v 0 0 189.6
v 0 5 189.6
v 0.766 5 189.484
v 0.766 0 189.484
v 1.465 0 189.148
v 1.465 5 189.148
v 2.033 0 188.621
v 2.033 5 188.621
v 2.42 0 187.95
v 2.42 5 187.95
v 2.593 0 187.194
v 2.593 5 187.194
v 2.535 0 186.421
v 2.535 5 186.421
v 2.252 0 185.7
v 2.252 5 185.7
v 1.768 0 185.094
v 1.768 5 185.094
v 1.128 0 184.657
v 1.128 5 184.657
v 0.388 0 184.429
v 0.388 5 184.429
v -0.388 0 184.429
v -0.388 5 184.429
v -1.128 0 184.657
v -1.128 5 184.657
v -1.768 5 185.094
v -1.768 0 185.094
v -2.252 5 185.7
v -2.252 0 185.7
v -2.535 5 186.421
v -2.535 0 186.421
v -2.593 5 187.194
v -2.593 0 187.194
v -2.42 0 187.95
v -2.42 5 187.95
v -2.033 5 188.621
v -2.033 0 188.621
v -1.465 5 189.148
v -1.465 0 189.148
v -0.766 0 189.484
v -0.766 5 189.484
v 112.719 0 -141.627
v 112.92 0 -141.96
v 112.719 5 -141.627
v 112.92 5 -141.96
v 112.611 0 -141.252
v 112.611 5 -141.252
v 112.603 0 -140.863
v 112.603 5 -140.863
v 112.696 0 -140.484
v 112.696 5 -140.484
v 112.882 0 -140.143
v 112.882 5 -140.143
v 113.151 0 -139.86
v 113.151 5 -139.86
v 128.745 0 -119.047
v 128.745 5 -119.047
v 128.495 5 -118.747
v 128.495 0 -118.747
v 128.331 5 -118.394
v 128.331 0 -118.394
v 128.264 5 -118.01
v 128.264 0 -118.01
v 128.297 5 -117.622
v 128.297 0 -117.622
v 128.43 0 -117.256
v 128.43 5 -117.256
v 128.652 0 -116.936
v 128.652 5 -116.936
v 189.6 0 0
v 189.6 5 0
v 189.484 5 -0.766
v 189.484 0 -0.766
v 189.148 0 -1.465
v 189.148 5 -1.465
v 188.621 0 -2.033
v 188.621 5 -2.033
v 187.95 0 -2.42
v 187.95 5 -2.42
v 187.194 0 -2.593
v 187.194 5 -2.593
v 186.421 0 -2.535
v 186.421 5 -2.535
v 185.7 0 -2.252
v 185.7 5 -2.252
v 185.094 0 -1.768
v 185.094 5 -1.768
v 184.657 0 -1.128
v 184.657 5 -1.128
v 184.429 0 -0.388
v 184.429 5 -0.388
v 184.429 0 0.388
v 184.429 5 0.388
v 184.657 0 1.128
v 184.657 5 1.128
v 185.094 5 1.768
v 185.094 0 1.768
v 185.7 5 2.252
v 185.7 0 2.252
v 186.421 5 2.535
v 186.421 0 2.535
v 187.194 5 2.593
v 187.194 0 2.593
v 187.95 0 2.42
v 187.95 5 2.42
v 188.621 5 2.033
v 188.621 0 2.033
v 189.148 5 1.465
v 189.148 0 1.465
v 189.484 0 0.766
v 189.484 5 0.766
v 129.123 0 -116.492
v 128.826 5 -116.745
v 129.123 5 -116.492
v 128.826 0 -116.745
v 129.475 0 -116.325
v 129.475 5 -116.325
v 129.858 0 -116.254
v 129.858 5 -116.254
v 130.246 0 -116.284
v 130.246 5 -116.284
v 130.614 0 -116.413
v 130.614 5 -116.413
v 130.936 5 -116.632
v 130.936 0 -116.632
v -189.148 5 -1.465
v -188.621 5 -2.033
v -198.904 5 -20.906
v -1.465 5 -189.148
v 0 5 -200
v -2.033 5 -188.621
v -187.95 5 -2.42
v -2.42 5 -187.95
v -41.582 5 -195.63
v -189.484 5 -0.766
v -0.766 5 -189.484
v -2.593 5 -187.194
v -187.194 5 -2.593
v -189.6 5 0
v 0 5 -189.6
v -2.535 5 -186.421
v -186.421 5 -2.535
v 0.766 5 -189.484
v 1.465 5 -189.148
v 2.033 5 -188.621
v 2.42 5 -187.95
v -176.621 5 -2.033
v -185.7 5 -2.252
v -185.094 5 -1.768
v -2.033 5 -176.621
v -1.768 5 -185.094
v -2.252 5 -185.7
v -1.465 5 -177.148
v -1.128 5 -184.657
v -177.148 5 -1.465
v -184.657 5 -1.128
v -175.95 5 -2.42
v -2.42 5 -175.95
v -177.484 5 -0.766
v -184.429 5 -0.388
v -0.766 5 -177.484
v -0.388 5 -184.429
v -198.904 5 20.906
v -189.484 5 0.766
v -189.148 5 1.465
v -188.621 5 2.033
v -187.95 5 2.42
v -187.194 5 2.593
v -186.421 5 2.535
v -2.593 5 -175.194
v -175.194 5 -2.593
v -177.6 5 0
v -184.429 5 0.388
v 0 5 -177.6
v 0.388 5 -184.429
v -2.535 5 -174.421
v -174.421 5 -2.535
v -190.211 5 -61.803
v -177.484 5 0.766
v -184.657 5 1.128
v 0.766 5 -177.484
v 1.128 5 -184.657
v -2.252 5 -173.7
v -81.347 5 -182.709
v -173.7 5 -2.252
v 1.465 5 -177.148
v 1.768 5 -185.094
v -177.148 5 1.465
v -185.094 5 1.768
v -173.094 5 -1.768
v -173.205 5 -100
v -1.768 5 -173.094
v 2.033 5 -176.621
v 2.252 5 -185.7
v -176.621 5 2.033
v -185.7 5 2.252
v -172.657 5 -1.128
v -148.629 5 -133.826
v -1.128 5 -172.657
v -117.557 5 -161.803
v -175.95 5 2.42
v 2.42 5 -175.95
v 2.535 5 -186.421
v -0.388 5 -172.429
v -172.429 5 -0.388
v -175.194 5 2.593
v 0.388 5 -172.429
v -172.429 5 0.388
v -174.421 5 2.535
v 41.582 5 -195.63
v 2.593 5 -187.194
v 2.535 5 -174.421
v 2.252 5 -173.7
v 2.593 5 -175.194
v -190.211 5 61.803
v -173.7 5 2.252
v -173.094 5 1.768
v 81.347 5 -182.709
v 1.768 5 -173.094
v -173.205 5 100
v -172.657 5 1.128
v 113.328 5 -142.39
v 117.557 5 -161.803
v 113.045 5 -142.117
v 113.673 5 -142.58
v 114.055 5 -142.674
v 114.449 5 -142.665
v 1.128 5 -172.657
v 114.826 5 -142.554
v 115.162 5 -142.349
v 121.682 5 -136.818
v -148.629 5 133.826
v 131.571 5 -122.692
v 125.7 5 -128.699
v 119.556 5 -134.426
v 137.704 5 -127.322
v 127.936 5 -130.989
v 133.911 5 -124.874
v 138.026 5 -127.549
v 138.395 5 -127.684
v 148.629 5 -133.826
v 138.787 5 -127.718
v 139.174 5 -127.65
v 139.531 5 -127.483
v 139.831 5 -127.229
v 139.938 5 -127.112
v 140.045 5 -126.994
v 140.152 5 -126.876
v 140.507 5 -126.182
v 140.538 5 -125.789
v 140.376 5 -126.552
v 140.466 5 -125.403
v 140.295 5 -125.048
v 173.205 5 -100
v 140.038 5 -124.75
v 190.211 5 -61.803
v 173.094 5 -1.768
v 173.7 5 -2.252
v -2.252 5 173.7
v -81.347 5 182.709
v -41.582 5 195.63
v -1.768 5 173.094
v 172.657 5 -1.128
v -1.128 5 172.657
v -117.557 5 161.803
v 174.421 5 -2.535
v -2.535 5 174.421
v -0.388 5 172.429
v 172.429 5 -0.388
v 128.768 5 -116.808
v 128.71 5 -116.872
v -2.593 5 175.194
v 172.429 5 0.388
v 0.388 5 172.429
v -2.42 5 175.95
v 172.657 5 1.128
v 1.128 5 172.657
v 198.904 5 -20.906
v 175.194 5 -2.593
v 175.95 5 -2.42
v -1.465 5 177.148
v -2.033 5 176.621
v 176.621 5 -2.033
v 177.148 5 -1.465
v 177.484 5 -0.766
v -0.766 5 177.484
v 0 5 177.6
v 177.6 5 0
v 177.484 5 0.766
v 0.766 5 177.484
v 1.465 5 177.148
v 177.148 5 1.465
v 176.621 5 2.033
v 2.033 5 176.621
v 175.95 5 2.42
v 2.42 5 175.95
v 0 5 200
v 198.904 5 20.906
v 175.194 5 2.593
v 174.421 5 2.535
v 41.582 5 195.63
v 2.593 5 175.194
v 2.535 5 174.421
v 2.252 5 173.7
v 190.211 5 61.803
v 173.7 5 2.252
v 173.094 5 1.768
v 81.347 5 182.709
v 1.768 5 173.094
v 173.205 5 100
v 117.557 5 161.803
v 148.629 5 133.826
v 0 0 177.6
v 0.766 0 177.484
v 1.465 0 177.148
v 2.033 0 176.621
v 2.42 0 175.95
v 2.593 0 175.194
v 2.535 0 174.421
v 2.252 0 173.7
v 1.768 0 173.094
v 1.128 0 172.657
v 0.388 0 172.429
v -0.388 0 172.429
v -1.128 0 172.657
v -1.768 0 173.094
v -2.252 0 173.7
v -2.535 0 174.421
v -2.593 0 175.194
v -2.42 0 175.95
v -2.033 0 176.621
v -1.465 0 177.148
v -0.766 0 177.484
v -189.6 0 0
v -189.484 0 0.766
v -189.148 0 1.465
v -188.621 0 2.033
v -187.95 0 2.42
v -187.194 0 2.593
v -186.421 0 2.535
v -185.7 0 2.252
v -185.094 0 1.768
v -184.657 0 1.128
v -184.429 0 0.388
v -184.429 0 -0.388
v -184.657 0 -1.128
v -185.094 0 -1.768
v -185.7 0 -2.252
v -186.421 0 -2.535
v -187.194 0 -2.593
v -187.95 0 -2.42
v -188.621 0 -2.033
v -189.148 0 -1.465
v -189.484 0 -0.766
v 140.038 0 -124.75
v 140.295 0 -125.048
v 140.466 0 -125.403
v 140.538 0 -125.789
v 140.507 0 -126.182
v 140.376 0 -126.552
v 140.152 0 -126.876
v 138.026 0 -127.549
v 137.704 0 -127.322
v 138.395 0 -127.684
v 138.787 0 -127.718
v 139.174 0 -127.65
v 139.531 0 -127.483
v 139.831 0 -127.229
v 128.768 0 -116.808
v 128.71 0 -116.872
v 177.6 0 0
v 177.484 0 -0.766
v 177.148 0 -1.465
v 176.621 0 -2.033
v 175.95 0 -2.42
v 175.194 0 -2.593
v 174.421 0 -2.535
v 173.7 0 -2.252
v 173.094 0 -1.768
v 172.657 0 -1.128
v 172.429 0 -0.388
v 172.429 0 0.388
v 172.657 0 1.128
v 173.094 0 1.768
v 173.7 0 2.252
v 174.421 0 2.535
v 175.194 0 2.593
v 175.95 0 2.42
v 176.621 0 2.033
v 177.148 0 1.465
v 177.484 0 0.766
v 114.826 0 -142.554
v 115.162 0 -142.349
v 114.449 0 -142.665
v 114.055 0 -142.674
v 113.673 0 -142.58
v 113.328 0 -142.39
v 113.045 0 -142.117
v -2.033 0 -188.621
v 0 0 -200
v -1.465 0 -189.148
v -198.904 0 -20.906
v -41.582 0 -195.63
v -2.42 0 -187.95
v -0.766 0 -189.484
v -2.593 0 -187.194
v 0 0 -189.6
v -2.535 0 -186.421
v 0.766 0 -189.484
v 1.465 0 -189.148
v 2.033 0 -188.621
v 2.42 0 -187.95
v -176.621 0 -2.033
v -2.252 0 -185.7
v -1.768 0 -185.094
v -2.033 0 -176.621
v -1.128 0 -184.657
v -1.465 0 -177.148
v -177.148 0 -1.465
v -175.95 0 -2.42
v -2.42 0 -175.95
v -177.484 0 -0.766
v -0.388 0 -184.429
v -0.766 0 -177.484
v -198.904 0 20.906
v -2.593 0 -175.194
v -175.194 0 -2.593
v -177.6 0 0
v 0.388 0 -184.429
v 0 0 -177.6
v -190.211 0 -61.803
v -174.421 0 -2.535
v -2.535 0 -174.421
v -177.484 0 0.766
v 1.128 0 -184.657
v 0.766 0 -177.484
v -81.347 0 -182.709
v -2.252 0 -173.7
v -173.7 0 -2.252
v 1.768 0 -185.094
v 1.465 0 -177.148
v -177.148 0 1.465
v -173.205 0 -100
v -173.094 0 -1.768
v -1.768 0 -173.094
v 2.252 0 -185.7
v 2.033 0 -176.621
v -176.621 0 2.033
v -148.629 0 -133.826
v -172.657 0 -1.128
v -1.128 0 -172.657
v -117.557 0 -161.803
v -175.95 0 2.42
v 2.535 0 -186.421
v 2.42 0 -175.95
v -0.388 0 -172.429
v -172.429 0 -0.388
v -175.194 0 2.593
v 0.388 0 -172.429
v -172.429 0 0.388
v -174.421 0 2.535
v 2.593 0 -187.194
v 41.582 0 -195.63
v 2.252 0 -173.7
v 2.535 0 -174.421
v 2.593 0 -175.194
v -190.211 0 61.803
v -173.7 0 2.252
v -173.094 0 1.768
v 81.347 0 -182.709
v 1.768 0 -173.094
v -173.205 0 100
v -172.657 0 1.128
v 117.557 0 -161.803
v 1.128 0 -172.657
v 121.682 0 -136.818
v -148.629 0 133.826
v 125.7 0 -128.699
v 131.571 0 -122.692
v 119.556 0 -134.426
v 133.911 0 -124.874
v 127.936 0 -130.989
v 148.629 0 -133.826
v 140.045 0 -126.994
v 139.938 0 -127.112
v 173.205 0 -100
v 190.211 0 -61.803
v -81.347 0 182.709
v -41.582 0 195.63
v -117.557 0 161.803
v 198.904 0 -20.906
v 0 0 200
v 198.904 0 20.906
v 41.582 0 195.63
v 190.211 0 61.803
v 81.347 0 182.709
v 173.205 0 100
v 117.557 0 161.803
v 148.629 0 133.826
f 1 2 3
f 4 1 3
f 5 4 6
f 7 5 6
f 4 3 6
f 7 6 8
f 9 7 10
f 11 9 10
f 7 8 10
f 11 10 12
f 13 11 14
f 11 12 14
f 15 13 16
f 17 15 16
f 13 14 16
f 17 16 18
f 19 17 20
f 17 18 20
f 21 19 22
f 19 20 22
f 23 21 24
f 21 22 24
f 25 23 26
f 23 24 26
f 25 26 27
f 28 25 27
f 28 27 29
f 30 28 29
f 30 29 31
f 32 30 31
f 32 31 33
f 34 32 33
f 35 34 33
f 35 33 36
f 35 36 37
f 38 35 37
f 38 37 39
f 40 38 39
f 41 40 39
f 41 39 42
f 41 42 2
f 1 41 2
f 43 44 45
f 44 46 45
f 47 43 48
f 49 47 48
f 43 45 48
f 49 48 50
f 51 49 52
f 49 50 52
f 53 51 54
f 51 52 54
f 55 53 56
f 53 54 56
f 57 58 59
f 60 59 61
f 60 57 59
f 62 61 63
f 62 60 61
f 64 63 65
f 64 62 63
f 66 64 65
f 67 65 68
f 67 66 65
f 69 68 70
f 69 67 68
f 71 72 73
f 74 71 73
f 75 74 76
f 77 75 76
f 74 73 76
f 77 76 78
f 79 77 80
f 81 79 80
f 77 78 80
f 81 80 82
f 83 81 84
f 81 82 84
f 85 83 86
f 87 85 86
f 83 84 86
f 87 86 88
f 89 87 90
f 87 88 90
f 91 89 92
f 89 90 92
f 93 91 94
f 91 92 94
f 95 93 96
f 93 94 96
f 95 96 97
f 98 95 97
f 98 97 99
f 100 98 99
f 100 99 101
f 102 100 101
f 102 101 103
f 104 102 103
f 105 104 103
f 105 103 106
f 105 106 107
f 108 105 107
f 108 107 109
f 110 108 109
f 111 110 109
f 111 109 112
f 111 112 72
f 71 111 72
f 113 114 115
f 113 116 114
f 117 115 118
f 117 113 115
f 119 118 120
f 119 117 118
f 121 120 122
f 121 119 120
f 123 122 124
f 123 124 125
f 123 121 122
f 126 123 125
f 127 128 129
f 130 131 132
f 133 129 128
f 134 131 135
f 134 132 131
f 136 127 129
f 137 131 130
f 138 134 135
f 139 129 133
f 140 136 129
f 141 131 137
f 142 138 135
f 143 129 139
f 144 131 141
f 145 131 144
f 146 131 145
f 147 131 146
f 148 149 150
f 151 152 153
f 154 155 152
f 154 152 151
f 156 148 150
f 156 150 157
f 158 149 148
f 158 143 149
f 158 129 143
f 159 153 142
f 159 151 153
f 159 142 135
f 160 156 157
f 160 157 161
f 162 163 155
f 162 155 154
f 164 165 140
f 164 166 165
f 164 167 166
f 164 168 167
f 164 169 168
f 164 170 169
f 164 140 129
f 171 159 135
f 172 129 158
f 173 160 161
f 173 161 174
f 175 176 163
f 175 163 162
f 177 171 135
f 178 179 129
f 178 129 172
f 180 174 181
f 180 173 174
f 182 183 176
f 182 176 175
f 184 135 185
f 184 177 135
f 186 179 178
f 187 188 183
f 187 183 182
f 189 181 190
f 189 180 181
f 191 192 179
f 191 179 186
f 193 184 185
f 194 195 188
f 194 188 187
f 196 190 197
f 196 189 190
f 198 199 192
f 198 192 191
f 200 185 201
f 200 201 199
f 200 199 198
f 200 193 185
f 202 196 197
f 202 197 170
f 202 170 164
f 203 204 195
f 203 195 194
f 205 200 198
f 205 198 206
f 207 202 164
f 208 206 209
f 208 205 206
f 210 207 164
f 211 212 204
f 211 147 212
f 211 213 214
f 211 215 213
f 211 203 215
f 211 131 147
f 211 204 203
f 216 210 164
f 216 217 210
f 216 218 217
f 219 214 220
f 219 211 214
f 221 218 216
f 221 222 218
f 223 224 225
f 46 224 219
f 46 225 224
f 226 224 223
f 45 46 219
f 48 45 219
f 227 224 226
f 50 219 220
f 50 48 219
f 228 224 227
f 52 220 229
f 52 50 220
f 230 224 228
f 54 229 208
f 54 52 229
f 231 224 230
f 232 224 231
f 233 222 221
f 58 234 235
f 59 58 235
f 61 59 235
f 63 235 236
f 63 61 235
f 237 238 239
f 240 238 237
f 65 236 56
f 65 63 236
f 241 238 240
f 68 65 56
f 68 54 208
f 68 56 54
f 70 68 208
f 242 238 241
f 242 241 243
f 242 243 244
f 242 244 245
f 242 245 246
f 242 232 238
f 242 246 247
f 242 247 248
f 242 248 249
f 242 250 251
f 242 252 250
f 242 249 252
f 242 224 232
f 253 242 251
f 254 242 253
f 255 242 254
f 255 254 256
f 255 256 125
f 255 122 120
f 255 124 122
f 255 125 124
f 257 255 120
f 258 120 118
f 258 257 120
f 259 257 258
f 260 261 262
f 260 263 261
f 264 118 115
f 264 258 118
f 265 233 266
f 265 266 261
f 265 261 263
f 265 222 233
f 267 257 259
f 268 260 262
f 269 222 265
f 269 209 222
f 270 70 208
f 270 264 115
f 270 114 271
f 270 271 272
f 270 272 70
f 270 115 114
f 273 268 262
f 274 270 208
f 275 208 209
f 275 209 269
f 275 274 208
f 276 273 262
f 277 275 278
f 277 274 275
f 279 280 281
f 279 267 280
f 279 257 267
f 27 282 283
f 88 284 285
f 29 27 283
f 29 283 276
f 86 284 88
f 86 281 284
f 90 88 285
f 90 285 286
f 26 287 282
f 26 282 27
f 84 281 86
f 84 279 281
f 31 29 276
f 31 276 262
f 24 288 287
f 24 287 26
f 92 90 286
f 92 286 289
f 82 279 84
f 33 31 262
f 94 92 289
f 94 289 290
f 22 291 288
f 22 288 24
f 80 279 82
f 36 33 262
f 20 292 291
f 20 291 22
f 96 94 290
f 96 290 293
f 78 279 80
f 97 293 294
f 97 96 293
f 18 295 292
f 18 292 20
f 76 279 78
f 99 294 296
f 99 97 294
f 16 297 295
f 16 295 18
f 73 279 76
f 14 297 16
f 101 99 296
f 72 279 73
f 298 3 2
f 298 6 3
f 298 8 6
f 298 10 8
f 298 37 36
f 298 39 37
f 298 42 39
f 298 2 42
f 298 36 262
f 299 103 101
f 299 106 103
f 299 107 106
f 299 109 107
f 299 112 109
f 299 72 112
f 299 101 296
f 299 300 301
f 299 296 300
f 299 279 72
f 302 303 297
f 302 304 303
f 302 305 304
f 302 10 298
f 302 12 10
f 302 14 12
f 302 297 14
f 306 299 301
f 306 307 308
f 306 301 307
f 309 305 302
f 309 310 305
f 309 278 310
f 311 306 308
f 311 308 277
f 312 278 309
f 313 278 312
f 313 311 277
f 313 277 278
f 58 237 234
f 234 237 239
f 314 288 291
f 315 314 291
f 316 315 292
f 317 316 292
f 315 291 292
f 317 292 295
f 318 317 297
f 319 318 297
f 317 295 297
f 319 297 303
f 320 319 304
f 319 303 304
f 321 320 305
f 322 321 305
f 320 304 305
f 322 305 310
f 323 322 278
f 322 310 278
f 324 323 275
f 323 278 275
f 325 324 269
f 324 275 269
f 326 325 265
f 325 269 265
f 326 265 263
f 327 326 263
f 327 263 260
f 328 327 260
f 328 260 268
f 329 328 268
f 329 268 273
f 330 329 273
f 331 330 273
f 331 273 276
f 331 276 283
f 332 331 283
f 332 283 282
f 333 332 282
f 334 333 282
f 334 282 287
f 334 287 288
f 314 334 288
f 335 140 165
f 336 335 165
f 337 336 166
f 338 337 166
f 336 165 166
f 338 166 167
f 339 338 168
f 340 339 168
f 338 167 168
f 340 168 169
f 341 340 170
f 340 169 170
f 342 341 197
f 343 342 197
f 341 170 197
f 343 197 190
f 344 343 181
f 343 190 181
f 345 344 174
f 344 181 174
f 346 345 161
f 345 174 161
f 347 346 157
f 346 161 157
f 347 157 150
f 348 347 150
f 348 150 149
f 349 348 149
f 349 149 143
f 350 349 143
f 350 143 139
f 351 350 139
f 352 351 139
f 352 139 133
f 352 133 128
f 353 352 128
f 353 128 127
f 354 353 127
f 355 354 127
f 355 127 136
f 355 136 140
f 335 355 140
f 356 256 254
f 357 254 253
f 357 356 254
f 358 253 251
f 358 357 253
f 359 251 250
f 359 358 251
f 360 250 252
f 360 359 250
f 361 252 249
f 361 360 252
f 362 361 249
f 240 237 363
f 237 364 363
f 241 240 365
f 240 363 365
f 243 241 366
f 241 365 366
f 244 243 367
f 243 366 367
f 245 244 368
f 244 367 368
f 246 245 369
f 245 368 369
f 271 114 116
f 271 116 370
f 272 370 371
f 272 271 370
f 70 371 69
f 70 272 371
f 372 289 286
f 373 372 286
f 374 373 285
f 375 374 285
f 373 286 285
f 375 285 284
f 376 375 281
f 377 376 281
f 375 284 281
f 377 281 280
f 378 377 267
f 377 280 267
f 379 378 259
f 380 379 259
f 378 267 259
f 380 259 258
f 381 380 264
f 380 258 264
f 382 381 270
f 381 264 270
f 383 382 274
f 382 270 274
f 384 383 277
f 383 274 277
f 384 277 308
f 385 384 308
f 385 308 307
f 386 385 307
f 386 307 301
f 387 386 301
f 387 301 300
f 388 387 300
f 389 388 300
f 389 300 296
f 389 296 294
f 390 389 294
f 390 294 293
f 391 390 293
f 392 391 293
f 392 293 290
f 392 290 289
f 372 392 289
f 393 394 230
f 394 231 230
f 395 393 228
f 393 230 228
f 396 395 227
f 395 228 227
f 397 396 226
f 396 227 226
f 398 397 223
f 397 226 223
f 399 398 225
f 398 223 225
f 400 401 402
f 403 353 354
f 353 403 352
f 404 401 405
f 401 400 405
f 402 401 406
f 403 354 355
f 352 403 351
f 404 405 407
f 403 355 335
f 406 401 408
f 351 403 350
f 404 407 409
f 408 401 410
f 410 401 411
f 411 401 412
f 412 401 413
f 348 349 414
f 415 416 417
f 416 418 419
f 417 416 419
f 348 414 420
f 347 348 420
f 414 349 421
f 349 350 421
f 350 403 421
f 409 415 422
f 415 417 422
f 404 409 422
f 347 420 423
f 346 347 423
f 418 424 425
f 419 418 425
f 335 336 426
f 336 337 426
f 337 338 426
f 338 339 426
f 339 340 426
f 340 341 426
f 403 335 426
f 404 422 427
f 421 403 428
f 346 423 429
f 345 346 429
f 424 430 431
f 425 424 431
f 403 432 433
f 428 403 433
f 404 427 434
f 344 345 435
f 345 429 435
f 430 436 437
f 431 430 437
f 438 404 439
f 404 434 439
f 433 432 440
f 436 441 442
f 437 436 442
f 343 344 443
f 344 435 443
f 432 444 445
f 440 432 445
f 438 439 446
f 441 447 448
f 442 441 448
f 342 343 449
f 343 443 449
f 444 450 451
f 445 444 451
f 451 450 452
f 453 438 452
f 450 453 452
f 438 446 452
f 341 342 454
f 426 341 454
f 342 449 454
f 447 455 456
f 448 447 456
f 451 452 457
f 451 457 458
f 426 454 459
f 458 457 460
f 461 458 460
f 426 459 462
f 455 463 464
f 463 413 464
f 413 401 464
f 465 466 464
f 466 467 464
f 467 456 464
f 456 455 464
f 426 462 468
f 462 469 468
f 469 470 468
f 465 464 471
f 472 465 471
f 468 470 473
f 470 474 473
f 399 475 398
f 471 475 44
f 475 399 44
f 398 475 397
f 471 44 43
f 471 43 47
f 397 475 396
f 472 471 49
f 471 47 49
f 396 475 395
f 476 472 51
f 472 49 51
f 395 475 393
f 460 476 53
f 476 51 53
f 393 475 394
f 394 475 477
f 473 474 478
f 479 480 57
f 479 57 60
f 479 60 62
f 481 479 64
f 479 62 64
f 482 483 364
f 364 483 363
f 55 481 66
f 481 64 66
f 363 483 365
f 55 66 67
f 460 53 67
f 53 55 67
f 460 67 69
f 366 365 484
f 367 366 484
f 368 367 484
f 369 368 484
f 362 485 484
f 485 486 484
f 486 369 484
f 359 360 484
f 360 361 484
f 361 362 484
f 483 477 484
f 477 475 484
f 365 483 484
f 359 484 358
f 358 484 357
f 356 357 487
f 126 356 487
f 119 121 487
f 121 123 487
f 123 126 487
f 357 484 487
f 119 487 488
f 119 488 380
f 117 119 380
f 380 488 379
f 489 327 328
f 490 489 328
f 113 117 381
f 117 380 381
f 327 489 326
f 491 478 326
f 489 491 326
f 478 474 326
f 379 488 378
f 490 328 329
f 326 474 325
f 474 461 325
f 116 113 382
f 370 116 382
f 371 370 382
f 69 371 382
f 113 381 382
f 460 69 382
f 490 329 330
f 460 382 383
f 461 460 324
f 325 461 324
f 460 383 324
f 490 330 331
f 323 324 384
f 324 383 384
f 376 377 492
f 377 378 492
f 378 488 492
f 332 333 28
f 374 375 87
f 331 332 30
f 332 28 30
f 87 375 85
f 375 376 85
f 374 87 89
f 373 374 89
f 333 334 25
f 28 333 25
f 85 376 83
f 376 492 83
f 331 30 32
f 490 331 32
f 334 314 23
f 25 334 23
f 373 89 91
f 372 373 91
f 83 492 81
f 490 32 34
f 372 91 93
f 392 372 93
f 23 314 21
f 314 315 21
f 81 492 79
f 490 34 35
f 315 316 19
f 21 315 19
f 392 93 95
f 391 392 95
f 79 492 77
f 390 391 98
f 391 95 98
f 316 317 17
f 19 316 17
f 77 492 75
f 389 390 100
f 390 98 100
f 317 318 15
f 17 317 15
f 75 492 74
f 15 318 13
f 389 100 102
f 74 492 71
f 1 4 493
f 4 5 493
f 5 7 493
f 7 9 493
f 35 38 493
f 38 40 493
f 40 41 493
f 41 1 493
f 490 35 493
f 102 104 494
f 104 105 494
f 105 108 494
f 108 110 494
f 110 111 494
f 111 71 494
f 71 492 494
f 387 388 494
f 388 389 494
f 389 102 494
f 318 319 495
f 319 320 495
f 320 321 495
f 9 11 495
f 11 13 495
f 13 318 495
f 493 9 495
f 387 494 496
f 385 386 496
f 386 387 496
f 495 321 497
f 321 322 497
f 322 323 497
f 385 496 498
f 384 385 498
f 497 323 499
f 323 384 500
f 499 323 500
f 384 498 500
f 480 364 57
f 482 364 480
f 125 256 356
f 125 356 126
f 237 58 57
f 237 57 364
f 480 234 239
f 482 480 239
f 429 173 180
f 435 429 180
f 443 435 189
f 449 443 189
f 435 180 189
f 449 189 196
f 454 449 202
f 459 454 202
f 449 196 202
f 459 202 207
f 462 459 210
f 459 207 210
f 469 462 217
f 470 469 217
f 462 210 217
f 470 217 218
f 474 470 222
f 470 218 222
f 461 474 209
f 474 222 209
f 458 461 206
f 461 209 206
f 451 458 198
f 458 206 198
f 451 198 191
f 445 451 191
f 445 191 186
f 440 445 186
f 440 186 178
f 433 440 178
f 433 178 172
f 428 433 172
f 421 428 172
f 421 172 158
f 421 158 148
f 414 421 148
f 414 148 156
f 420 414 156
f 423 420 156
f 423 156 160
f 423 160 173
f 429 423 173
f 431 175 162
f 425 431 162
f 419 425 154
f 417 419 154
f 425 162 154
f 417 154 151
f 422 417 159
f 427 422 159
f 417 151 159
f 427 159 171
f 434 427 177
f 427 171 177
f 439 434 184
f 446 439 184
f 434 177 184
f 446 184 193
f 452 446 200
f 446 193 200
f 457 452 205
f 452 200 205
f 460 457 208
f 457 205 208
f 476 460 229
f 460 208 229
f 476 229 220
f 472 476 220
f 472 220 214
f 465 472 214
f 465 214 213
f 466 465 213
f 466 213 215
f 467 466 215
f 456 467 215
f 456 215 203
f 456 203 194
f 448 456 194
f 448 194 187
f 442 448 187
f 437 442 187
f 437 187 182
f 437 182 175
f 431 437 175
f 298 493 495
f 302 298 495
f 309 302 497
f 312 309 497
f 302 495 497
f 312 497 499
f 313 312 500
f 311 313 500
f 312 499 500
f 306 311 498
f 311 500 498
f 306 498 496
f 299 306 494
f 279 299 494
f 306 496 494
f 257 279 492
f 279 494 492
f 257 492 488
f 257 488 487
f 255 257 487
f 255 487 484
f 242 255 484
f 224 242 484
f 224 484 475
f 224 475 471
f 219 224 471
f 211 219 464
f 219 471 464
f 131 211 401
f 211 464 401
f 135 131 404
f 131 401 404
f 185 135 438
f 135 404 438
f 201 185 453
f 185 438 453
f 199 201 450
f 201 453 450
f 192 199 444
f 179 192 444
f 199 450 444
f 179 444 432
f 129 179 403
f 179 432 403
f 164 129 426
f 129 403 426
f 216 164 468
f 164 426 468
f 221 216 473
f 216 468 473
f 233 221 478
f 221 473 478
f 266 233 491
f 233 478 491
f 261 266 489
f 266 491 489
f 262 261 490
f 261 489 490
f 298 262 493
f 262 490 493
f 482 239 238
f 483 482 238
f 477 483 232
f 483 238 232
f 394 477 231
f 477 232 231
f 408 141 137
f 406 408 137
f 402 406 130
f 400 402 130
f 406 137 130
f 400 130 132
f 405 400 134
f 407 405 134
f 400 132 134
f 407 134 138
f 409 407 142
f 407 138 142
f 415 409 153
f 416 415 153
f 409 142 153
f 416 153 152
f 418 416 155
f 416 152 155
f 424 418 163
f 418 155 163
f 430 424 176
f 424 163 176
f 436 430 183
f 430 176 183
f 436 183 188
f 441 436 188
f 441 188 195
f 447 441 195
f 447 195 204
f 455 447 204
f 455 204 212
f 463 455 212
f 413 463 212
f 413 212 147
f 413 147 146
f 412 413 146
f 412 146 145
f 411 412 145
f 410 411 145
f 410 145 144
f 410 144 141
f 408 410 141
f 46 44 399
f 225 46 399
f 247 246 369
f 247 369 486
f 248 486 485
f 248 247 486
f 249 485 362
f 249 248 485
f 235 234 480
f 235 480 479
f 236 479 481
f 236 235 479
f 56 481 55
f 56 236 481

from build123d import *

# Parameters (mm, degrees)
SKETCH_1_R               = 200
EXTRUDE_257_DEPTH        = 5
CUT_EXTRUDE_3_REACH      = 284.887
SKETCH_2_R               = 2.6
PATTERN_CIRCULAR_1_COUNT = 4
SKETCH_4_W               = 3.2
SKETCH_4_H               = 12.2
CUT_REVOLVE_3_ANGLE      = 8.5
FILLET_2_R               = 1.5
CUT_EXTRUDE_1561_REACH   = 284.887
FILLET_1_R               = 1.5


with BuildPart() as part:
    # 草图1 → Extrude 257 (new body)
    with BuildSketch(Plane(origin=(0, 0, 0), x_dir=(1, 0, 0), z_dir=(0, 1, 0))):
        Circle(SKETCH_1_R)
    extrude(amount=EXTRUDE_257_DEPTH)

    # 草图2 → 切除-拉伸3 (cut, up to next)
    with BuildSketch(Plane(origin=(0, 5, 0), x_dir=(1, 0, 0), z_dir=(0, 1, 0)), mode=Mode.PRIVATE) as cut_extrude_3_sk1:
        with Locations((0, -175)):
            Circle(SKETCH_2_R)
    cut_extrude_3_tool1 = extrude(cut_extrude_3_sk1.sketch, amount=-CUT_EXTRUDE_3_REACH, mode=Mode.PRIVATE) & part.part
    # 草图2 → 切除-拉伸3 (cut, up to next)
    with BuildSketch(Plane(origin=(0, 5, 0), x_dir=(1, 0, 0), z_dir=(0, 1, 0)), mode=Mode.PRIVATE) as cut_extrude_3_sk2:
        with Locations((0, -187)):
            Circle(SKETCH_2_R)
    cut_extrude_3_tool2 = extrude(cut_extrude_3_sk2.sketch, amount=-CUT_EXTRUDE_3_REACH, mode=Mode.PRIVATE) & part.part
    cut_extrude_3_1 = cut_extrude_3_tool1.solids().sort_by_distance((0, 5, 175))[0]
    add(cut_extrude_3_1, mode=Mode.SUBTRACT)
    cut_extrude_3_2 = cut_extrude_3_tool2.solids().sort_by_distance((0, 5, 187))[0]
    add(cut_extrude_3_2, mode=Mode.SUBTRACT)
    cut_extrude_3 = cut_extrude_3_1 + cut_extrude_3_2  # 切除-拉伸3 as one shape, for the pattern or mirror that repeats it

    # 阵列(圆周)1: 切除-拉伸3 ×4 about axis
    pattern_circular_1_axis = Axis((0, -55, 0), (0, 1, 0))
    for i in range(1, PATTERN_CIRCULAR_1_COUNT):
        add(cut_extrude_3.rotate(pattern_circular_1_axis, i * 360 / PATTERN_CIRCULAR_1_COUNT), mode=Mode.SUBTRACT)

    # 草图4 → 切除-旋转3 (revolve, cut)
    with BuildSketch(Plane(origin=(0, 0, 0), x_dir=(0.73135370161917, 0, -0.6819983600624991), z_dir=(0.6819983600624991, 0, 0.73135370161917))):
        with Locations((181.5, 3)):
            Rectangle(SKETCH_4_W, SKETCH_4_H)
    revolve(axis=Axis((0, -55, 0), (0, 1, 0)), revolution_arc=CUT_REVOLVE_3_ANGLE, mode=Mode.SUBTRACT)

    # 圆角2
    fillet_2_edges = [part.edges().sort_by_distance(p)[0] for p in [
        (111.990383131, 2.5, -140.791207418),
        (113.982429968, 2.5, -143.29555352),
    ]]
    fillet(fillet_2_edges, radius=FILLET_2_R)

    # 草图6 → Cut-Extrude 1561 (cut, up to next)
    with BuildSketch(Plane(origin=(0, 5, 0), x_dir=(1, 0, 0), z_dir=(0, 1, 0)), mode=Mode.PRIVATE) as cut_extrude_1561_sk1:
        with BuildLine():
            Line((127.646791587, 118.032637546), (138.809893683, 128.343047734))
            ThreePointArc((138.809893683, 128.343047734), (139.99182369, 127.052799206), (141.161761211, 125.751666622))
            Line((141.161761211, 125.751666622), (129.820417839, 115.637649754))
            ThreePointArc((129.820417839, 115.637649754), (128.739174201, 116.840198367), (127.646791587, 118.032637546))
        make_face()
    cut_extrude_1561_tool1 = extrude(cut_extrude_1561_sk1.sketch, amount=-CUT_EXTRUDE_1561_REACH, mode=Mode.PRIVATE) & part.part
    add(cut_extrude_1561_tool1.solids().sort_by_distance((134.437436, 5, -122.011787))[0], mode=Mode.SUBTRACT)

    # 圆角1
    fillet_1_edges = [part.edges().sort_by_distance(p)[0] for p in [
        (129.820417839, 2.5, -115.637649754),
        (141.161761211, 2.5, -125.751666622),
        (138.809893683, 2.5, -128.343047734),
        (127.646791587, 2.5, -118.032637546),
    ]]
    fillet(fillet_1_edges, radius=FILLET_1_R)


solid = part.part
